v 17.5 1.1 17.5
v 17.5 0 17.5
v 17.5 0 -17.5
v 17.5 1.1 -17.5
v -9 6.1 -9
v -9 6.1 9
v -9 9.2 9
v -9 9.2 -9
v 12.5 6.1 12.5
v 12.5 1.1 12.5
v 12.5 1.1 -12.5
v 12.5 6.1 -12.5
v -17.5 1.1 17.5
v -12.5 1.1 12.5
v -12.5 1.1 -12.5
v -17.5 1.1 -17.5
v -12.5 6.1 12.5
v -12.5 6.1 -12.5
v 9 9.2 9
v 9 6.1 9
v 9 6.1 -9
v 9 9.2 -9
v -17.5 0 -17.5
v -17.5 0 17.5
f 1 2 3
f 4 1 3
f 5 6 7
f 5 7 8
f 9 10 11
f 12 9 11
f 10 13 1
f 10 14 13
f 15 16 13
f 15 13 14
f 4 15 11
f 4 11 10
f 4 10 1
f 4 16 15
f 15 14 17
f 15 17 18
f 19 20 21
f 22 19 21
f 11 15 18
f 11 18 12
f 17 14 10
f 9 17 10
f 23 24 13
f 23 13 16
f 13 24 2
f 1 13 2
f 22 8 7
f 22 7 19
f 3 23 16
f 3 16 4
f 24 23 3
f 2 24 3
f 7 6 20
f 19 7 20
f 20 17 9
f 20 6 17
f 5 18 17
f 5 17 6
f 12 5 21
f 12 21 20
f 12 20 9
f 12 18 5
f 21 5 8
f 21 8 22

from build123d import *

# Parameters (mm, degrees)
SKETCH1_W           = 35
SKETCH1_H           = 35
BOSS_EXTRUDE1_DEPTH = 1.1
SKETCH2_W           = 25
SKETCH2_H           = 25
BOSS_EXTRUDE2_DEPTH = 5
SKETCH3_W           = 18
SKETCH3_H           = 18
BOSS_EXTRUDE6_DEPTH = 3.1


with BuildPart() as part:
    # Sketch1 → Boss-Extrude1 (new body)
    with BuildSketch(Plane(origin=(0, 0, 0), x_dir=(1, 0, 0), z_dir=(0, 1, 0))):
        Rectangle(SKETCH1_W, SKETCH1_H)
    extrude(amount=BOSS_EXTRUDE1_DEPTH)

    # Sketch2 → Boss-Extrude2 (add)
    with BuildSketch(Plane(origin=(0, 1.1, 0), x_dir=(1, 0, 0), z_dir=(0, 1, 0))):
        Rectangle(SKETCH2_W, SKETCH2_H)
    extrude(amount=BOSS_EXTRUDE2_DEPTH)

    # Sketch3 → Boss-Extrude6 (add)
    with BuildSketch(Plane(origin=(0, 6.1, 0), x_dir=(1, 0, 0), z_dir=(0, 1, 0))):
        Rectangle(SKETCH3_W, SKETCH3_H)
    extrude(amount=BOSS_EXTRUDE6_DEPTH)


solid = part.part
